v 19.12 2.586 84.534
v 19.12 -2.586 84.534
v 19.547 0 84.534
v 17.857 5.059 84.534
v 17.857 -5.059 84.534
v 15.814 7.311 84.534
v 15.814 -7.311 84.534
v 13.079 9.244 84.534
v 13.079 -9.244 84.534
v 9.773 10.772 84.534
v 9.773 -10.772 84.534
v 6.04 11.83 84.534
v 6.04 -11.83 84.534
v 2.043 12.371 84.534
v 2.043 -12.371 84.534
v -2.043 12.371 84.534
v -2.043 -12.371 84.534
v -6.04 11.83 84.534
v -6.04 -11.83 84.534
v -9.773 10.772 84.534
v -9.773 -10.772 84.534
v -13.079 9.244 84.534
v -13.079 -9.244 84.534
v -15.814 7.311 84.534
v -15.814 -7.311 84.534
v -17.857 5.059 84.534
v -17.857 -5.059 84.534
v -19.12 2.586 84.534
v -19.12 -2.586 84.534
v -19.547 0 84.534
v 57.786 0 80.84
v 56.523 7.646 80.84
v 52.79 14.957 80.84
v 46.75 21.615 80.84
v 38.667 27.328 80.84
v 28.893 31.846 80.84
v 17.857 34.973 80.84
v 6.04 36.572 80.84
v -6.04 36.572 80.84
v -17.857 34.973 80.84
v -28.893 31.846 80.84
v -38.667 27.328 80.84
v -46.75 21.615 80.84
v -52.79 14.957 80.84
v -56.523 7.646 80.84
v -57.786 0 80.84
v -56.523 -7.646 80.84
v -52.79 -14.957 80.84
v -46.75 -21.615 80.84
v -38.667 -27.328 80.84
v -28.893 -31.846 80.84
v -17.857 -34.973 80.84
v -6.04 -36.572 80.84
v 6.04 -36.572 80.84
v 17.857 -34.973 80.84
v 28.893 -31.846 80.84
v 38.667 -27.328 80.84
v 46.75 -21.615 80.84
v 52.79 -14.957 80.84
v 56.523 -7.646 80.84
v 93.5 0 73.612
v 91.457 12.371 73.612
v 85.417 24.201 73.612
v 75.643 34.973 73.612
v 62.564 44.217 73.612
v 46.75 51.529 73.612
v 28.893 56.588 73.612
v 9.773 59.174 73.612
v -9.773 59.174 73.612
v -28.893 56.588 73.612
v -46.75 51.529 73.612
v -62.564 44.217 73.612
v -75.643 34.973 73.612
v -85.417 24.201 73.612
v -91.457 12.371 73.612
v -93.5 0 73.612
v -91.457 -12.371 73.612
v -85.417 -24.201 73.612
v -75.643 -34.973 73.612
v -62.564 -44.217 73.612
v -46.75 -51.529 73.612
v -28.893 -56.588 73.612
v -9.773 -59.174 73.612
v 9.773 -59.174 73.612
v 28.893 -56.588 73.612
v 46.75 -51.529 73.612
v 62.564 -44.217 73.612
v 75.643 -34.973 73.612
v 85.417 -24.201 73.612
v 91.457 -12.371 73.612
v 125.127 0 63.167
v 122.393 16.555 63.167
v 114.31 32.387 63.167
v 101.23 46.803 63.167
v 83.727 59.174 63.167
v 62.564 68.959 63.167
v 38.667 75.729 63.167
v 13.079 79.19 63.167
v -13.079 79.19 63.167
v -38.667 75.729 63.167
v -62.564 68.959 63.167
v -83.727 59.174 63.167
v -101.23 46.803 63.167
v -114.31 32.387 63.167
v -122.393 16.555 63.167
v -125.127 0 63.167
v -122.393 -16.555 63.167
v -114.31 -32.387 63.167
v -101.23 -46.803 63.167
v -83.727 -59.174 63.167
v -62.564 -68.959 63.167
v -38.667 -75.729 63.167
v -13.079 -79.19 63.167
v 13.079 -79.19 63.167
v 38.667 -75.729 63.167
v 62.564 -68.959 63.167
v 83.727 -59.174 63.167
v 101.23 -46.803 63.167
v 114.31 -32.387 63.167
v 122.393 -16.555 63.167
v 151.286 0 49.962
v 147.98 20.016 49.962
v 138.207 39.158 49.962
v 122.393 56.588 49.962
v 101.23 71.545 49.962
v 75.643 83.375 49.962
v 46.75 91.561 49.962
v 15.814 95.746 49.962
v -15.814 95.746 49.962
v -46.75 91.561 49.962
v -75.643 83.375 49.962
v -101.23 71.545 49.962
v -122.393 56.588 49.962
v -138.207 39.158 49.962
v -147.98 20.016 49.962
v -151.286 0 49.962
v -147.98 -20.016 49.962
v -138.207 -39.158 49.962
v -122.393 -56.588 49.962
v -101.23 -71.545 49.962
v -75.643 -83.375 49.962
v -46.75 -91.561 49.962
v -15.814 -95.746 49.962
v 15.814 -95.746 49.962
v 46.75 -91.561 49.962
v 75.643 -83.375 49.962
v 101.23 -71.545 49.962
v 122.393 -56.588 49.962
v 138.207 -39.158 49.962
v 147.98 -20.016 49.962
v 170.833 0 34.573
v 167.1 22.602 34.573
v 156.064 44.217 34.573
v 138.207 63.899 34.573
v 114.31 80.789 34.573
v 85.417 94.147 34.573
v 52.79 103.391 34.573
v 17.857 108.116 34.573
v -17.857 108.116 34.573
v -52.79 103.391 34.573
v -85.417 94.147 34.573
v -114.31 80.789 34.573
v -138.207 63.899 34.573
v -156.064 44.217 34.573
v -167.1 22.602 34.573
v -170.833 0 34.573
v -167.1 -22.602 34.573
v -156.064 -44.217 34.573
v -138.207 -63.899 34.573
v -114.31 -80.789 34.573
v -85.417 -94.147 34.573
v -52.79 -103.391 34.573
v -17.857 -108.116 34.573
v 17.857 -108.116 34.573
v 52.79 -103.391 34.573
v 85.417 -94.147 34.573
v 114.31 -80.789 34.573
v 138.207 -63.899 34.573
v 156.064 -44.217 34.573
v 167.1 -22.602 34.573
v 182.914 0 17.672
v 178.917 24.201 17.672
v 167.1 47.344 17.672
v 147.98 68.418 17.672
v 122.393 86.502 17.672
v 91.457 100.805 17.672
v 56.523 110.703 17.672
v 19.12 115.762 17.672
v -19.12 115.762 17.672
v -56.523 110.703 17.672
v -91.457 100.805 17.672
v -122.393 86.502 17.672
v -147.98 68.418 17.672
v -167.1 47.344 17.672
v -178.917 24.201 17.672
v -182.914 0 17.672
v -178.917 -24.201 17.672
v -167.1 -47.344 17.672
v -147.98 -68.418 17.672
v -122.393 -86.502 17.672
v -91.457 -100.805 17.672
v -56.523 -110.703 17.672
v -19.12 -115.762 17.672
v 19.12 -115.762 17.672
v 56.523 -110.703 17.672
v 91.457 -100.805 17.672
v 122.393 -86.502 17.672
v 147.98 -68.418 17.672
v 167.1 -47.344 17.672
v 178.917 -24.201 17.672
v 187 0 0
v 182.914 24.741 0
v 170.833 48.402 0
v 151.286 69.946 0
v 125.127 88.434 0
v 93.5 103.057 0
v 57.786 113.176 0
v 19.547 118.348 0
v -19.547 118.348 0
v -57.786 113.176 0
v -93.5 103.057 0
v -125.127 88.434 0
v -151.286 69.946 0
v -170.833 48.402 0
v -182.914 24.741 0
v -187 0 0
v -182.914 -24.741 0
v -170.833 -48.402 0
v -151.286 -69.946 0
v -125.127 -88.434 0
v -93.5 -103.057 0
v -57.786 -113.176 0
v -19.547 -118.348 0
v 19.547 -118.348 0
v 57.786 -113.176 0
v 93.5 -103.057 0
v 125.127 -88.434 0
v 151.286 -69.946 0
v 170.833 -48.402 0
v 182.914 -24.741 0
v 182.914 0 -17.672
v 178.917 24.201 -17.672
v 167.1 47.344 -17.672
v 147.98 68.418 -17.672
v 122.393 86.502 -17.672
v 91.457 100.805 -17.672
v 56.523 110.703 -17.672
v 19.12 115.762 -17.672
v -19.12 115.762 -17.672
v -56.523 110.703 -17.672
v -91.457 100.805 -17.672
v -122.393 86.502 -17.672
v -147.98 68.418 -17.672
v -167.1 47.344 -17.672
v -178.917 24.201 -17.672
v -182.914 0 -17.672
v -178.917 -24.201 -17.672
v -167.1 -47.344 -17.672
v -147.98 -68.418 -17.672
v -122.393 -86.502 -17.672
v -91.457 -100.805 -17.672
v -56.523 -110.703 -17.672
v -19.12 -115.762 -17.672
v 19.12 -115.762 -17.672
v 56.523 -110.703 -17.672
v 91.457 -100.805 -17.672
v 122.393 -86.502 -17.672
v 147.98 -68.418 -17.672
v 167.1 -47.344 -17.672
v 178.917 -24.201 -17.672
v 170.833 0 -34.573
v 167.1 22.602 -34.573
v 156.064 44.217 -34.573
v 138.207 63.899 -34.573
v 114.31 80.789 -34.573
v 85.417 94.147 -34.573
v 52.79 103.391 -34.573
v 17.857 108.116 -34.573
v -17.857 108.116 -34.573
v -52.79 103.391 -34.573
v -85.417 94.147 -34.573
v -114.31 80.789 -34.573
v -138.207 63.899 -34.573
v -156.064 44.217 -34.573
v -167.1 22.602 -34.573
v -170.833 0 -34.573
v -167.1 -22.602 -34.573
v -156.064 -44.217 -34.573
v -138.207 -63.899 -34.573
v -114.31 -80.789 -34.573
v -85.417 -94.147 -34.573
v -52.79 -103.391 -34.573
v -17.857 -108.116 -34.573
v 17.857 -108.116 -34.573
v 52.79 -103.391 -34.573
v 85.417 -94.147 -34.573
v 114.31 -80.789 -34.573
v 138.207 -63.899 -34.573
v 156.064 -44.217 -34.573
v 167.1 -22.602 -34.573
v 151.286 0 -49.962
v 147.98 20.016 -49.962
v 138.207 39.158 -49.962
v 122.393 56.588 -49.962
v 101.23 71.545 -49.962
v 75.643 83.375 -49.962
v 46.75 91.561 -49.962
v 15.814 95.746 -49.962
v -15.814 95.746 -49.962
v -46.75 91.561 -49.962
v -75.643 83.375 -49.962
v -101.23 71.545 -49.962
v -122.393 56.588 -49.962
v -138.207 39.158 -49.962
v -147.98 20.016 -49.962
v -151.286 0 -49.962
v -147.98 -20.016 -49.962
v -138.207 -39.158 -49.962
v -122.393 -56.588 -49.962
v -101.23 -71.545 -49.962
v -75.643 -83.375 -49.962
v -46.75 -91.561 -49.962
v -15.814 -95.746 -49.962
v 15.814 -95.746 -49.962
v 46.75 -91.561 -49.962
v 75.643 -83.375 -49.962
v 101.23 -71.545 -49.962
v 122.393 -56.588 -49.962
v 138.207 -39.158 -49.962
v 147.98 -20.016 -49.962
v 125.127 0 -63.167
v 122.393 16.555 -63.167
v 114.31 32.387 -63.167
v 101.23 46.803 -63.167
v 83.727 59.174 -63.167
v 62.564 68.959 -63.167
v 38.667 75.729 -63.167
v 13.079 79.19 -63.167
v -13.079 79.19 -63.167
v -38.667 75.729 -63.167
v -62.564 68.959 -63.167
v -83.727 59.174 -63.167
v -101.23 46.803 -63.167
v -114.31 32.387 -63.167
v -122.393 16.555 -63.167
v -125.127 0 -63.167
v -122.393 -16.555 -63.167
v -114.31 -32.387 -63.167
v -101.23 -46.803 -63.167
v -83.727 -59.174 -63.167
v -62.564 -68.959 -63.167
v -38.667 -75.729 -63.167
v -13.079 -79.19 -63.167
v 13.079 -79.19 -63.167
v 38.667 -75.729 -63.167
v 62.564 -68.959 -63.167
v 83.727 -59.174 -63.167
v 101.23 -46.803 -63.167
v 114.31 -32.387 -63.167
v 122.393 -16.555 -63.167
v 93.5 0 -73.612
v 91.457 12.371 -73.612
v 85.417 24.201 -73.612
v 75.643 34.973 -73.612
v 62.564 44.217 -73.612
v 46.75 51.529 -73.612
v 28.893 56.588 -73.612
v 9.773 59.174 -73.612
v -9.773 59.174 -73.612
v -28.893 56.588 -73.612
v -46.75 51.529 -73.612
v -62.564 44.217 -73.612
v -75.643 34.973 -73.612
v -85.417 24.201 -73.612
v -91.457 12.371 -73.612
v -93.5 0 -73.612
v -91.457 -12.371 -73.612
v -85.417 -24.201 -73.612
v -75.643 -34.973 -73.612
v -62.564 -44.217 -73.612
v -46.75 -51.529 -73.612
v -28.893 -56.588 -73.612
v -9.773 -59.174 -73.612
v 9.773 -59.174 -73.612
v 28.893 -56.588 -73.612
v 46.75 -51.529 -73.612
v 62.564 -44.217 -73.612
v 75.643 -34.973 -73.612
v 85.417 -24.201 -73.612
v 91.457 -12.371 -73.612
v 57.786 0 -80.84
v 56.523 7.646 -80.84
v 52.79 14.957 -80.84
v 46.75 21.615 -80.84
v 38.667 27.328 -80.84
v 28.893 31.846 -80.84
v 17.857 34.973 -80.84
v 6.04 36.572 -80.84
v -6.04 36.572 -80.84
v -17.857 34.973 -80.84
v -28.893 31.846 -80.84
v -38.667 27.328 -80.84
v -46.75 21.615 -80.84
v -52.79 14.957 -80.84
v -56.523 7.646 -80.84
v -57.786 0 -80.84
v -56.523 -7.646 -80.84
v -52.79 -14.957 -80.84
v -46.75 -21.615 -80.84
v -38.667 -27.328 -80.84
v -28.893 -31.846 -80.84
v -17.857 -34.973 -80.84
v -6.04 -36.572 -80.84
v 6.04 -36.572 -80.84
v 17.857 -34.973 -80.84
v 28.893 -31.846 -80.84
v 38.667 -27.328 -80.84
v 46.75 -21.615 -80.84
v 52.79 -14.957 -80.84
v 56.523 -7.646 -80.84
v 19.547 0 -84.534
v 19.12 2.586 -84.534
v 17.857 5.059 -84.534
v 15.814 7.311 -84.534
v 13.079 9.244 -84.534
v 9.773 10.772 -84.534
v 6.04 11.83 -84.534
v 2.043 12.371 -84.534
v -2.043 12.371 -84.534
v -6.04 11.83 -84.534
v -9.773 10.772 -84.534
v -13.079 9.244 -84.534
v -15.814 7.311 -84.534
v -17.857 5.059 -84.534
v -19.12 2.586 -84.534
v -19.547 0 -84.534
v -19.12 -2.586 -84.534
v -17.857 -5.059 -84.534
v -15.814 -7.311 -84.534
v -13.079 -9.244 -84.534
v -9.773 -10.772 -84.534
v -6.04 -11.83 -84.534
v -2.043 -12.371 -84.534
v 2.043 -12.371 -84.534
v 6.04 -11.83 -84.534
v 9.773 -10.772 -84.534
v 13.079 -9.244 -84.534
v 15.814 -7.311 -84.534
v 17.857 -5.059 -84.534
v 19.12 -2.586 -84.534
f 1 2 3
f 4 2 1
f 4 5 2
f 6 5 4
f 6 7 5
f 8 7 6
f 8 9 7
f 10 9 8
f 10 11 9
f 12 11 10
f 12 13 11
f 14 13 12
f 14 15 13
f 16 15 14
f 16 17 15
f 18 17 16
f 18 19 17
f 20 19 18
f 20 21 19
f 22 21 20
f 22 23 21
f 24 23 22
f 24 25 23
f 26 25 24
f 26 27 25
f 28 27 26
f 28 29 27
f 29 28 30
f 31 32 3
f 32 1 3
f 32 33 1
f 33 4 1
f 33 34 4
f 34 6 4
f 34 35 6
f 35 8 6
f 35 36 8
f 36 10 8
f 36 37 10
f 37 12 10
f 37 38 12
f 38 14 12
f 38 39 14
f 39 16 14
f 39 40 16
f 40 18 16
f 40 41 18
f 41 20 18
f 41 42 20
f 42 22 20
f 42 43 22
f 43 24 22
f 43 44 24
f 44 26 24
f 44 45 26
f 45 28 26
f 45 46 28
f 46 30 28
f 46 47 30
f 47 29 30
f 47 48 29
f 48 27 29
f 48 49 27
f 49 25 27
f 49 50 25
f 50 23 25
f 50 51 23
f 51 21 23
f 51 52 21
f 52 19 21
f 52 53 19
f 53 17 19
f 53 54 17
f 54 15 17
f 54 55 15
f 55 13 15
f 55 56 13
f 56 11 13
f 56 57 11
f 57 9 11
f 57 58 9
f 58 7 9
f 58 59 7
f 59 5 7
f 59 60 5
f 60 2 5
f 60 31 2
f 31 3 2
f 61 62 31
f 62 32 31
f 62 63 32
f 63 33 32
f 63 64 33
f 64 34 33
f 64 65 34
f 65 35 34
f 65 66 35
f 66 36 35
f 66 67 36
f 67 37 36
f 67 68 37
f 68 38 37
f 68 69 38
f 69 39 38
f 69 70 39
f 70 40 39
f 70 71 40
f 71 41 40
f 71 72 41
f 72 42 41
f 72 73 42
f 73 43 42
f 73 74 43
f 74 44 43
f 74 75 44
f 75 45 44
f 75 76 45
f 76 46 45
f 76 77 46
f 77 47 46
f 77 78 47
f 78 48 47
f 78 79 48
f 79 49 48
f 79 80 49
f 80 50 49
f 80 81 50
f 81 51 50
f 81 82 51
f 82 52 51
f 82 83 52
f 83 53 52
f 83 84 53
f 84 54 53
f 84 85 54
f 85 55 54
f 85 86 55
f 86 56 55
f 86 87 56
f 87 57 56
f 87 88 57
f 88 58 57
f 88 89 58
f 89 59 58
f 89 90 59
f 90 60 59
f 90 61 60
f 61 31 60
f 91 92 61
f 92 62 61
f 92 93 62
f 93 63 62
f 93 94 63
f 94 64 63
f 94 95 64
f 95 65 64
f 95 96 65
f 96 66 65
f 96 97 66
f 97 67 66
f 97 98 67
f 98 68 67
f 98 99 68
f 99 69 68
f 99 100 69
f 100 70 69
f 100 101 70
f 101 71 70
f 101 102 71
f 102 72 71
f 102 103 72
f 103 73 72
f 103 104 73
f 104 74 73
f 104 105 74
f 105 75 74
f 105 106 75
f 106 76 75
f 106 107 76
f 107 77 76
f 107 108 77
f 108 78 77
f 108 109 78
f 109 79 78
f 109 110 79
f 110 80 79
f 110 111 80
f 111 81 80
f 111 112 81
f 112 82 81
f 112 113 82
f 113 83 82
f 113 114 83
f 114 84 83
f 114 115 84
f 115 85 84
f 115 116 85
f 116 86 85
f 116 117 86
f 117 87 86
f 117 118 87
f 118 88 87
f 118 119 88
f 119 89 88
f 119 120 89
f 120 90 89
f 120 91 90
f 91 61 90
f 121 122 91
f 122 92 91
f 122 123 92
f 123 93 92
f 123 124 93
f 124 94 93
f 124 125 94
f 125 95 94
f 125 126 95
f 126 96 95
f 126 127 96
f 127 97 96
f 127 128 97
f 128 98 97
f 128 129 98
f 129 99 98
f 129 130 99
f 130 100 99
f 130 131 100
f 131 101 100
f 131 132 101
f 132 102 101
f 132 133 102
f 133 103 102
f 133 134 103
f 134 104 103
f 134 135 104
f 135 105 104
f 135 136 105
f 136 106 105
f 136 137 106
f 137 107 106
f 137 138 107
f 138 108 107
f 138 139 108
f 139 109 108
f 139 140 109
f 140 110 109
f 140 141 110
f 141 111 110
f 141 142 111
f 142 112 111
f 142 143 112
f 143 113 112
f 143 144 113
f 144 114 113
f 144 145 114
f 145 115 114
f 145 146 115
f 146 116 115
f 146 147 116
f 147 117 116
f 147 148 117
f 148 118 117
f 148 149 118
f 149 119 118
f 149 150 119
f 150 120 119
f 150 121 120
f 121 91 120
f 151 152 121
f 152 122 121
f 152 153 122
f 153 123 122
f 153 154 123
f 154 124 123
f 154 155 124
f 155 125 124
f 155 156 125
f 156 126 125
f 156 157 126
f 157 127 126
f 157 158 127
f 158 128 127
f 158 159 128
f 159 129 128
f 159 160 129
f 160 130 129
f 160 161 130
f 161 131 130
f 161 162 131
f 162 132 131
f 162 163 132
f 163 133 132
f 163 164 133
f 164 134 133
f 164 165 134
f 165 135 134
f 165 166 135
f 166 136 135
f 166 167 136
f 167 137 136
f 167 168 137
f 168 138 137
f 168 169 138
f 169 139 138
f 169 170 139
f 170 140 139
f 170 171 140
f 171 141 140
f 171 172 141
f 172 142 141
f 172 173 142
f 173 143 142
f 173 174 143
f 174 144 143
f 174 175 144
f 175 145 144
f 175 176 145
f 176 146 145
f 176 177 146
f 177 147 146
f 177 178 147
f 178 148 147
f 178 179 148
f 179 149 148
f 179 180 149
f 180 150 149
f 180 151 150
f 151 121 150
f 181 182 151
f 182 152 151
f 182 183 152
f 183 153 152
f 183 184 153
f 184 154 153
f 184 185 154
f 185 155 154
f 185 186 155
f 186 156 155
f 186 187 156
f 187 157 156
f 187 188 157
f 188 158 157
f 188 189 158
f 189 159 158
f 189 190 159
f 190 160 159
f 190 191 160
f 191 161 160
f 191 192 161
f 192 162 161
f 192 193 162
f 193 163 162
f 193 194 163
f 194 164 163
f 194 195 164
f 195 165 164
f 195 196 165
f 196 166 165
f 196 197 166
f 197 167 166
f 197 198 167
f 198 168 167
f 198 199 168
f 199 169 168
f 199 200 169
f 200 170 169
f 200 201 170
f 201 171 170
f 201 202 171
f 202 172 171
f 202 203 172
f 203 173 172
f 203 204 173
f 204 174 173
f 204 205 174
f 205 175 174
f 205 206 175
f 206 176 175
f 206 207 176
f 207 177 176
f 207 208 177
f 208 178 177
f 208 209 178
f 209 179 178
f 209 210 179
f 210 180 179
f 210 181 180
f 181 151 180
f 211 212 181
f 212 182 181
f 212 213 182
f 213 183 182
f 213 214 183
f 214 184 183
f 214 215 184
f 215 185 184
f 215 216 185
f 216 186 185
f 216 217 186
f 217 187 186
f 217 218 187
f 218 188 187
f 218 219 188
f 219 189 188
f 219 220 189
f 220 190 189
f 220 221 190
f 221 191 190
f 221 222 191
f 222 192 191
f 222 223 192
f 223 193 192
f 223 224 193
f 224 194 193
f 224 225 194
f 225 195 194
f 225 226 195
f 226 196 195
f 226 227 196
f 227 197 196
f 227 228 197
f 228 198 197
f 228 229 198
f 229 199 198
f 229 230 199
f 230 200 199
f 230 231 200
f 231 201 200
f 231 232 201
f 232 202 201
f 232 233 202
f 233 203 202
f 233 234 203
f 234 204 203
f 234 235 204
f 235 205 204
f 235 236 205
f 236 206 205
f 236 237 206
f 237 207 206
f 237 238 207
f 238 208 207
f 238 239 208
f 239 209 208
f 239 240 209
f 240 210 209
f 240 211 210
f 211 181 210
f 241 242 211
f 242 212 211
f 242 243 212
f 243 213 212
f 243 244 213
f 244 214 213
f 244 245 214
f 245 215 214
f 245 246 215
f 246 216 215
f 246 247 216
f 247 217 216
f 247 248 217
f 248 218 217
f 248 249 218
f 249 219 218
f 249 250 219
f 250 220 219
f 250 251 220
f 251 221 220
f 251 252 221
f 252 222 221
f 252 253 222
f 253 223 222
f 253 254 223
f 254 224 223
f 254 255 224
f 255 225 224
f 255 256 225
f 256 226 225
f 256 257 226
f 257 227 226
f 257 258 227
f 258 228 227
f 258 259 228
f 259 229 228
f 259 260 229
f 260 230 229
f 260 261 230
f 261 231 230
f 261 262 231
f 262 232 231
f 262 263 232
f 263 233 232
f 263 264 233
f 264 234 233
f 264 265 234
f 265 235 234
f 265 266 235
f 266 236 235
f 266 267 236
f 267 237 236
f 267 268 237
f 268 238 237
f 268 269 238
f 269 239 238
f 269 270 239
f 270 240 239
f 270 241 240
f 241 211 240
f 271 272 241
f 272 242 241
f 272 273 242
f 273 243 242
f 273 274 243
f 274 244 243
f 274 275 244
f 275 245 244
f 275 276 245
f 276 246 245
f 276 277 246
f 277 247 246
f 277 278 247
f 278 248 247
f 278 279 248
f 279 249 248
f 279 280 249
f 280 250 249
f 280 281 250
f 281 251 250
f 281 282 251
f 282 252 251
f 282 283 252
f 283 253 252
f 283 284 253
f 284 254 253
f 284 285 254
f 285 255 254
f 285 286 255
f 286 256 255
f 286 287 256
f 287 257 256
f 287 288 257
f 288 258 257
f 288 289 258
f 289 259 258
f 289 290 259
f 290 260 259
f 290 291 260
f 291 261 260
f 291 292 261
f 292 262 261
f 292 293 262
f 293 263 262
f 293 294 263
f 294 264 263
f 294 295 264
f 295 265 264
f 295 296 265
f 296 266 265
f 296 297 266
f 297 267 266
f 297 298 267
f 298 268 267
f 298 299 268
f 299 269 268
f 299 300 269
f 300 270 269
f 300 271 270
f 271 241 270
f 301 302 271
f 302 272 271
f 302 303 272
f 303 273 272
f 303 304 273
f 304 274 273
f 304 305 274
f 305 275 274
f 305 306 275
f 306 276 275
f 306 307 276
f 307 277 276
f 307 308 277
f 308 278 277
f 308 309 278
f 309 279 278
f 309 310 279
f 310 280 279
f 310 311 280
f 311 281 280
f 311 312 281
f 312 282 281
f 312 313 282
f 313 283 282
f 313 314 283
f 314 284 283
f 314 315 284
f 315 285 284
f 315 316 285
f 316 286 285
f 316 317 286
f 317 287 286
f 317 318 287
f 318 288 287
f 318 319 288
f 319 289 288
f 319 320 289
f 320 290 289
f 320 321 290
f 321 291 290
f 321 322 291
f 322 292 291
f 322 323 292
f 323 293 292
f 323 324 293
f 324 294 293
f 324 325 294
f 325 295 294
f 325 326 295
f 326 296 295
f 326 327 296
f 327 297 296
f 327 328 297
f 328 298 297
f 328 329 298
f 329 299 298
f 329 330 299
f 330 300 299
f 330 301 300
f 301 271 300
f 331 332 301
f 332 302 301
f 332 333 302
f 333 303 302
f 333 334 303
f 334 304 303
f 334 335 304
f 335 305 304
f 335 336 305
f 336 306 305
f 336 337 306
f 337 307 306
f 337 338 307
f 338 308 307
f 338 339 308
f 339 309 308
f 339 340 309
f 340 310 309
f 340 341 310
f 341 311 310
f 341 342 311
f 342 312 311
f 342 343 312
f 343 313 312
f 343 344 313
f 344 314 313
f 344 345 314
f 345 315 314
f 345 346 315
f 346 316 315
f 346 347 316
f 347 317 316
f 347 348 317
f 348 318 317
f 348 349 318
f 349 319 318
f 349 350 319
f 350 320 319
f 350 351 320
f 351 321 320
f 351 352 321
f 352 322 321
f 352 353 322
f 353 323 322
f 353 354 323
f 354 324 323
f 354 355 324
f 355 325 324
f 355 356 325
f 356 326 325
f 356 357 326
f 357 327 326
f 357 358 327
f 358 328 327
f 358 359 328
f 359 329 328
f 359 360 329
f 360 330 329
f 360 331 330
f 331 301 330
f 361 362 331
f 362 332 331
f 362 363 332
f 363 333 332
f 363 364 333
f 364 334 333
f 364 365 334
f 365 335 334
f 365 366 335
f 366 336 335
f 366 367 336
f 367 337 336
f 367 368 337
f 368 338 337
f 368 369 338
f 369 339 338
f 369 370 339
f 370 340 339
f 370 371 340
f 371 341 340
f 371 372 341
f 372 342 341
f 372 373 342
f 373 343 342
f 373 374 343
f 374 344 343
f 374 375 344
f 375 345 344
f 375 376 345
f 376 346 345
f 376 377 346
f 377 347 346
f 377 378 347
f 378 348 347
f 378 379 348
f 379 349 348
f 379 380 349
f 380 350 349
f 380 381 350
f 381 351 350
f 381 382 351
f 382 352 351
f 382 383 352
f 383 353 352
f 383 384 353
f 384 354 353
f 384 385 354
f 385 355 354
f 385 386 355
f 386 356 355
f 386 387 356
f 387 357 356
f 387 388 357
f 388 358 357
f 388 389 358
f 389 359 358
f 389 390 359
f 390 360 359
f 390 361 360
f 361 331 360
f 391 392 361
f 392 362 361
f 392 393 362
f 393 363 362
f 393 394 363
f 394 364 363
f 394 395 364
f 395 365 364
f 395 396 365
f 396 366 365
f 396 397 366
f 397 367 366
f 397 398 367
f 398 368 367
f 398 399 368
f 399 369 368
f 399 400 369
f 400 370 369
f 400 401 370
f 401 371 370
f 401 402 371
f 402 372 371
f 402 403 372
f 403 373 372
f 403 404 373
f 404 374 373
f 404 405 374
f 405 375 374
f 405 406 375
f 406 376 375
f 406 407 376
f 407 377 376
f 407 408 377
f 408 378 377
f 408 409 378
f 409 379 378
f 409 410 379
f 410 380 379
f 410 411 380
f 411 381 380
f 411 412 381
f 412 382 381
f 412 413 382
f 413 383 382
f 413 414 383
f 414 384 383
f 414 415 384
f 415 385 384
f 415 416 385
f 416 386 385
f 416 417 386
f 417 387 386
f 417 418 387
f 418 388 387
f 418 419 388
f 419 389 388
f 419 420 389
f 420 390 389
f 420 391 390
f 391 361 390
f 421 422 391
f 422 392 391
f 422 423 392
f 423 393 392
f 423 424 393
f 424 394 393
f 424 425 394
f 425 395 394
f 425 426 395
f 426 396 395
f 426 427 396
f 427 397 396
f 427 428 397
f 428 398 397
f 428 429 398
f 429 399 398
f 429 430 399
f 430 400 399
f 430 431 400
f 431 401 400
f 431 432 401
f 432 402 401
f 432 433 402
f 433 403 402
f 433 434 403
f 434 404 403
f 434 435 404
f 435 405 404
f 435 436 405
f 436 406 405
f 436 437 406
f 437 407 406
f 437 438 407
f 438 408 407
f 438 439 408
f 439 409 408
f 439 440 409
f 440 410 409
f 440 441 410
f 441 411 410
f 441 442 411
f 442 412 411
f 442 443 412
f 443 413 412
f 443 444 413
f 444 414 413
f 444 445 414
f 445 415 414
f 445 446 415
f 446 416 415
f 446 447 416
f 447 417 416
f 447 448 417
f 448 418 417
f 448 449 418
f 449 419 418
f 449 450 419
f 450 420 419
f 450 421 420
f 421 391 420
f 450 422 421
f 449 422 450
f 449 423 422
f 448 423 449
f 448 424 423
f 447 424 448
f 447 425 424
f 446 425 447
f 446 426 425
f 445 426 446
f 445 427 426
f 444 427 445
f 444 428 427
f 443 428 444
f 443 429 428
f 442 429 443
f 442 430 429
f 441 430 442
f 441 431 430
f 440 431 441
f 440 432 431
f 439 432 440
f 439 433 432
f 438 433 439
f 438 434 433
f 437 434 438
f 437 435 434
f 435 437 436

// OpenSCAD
// Generated by SolidPython 1.0.1 on 2020-07-29 00:46:49


scale(v = [11, 7, 5]) {
	sphere(r = 17);
}
/***********************************************
*********      SolidPython code:      **********
************************************************
 
# import packages: SolidPython
from solid import *
from solid.utils import *
from itertools import chain, combinations, permutations


class Resize:

    def __init__(self, scad_file):
        self.scad_file = scad_file
        #self.scad_file = import_scad(scad_file)
        # cone/cylinder param:
        self.r1 = 0
        self.r2 = 0
        self.h = 0
        # rectangular prism param:
        self.w = 0
        self.l = 0
        # ellipse param:
        self.r = 0

    # import OpenScad code (file name corresponds to shape)


    # classify shape + parameters
    def assign(self, param1, param2, param3):
        if self.scad_file == 'cone.scad':
            self.r1 = param1
            self.r2 = param2
            self.h = param3
        elif self.scad_file == 'cylinder.scad':
            self.r1 = param1
            self.r2 = param2
            self.h = param3
        elif self.scad_file == 'rectangularPrism.scad':
            self.h = param1
            self.l = param2
            self.w = param3
        else:
            self.r = param1
            self.h = param2

    # resize parameters
    def iterate(self):
        x = range(3, 20, 2)
        i = 1
        if self.scad_file == 'cone.scad':
            tempList = list(permutations(x, 2))
            for temp in tempList:
                param1 = temp[0]
                param2 = temp[1]
                filepath = 'produced_scad_files/' + 'cone' + str(param1) + '_' + str(param2) + '_' + '.scad'
                scad_render_to_file(cylinder(h=param1, r1=param2, r2=0), filepath)

        elif self.scad_file == 'cylinder.scad':
            tempList = list(permutations(x, 3))
            for temp in tempList:
                param1 = temp[0]
                param2 = temp[1]
                filepath = 'produced_scad_files/' + 'cylinder' + str(param1) + '_' + str(param2) + '_' + '.scad'
                scad_render_to_file(cylinder(h=param1, r1=param2, r2=param2), filepath)

        elif self.scad_file == 'rectangularPrism.scad':
            tempList = list(permutations(x, 3))
            for temp in tempList:
                param1 = temp[0]
                param2 = temp[1]
                param3 = temp[2]
                filepath = 'produced_scad_files/' + 'rectangularPrism' + str(param1) + '_' + str(param2) + '_' + str(
                    param3) + '.scad'
                scad_render_to_file(cube(size=(param1, param2, param3)), filepath)

        elif self.scad_file == 'ellipse.scad':
            tempList = list(permutations(x, 4))
            for temp in tempList:
                param1 = temp[0]
                param2 = temp[1]
                param3 = temp[2]
                param4 = temp[3]
                filepath = 'produced_scad_files/' + 'ellipse' + str(param1) + '_' + str(param2) + '_' + str(param3) + '_' + str(param4) + '.scad'
                scad_render_to_file(scale([param1, param2, param3])(sphere(r=param4)), filepath)

    def render_to_scadfile(self):
        scad_render_to_file(scad, 'example.scad') 
 
************************************************/
